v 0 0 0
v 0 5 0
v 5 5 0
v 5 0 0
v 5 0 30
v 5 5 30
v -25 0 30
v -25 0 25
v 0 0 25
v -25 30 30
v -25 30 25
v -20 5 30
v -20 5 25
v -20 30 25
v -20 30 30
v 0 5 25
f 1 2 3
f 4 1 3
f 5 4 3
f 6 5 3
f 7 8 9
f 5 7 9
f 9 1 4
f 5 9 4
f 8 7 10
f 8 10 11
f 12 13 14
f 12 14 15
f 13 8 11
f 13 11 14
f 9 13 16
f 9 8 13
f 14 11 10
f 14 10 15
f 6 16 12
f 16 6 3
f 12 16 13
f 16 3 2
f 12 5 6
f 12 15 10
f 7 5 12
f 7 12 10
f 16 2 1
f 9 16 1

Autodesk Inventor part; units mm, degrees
ref_plane "YZ Plane" through (0, 0, 0) normal (1, 0, 0) x (0, 1, 0)
ref_plane "XZ Plane" through (0, 0, 0) normal (0, 1, 0) x (-1, 0, 0)
ref_plane "XY Plane" through (0, 0, 0) normal (0, 0, 1) x (1, 0, 0)
sketch "草圖1" plane through (0, 0, 0) normal (0, 0, 1) x (1, 0, 0)
  line L0 (0, 0) -> (5, 0)
  line L1 (5, 0) -> (5, 5)
  line L2 (5, 5) -> (0, 5)
  line L3 (0, 5) -> (0, 0)
  dimension "d0" = 5
  dimension "d1" = 5
extrude "擠出1" add sketch "草圖1" along normal blind 30
sketch "草圖2" plane through (0, 0, 0) normal (-1, 0, 0) x (0, 0, 1)
  line L0 (30, 0) -> (30, 5) projected
  line L1 (0, 0) -> (30, 0) projected
  line L2 (30, 5) -> (25, 5)
  line L3 (25, 5) -> (25, 0)
  line L4 (25, 0) -> (30, 0)
  line L5 (30, 0) -> (30, 5)
  dimension "d4" = 5
extrude "擠出2" add sketch "草圖2" along normal blind 25
sketch "草圖3" plane through (0, 5, 0) normal (0, 1, 0) x (1, 0, 0)
  line L0 (-25, -30) -> (-25, -25) projected
  line L1 (5, -30) -> (-25, -30) projected
  line L2 (-25, -25) -> (-20, -25)
  line L3 (-20, -25) -> (-20, -30)
  line L4 (-20, -30) -> (-25, -30)
  line L5 (-25, -30) -> (-25, -25)
  point P0 (0, 0)
  dimension "d7" = 5
extrude "擠出3" add sketch "草圖3" along normal blind 25
sketch "草圖4" plane through (0, 0, 0) normal (0, -1, 0) x (1, 0, 0)
  line L0 (5, 0) -> (0, 5)
  line L1 (5, 5) -> (0, 10)
  dimension "d11" = 5
sketch "草圖5" plane through (5, 0, 0) normal (1, 0, 0) x (0, 0, -1)
  line L0 (0, 0) -> (0, 5) projected
  line L1 (0, 0) -> (-30, 0) projected
  line L2 (0, 5) -> (-5, 5)
  line L3 (-5, 5) -> (-5, 0)
  line L4 (-5, 0) -> (0, 0)
  line L5 (0, 0) -> (0, 5)
  dimension "d10" = 5
properties part number "triangle"
